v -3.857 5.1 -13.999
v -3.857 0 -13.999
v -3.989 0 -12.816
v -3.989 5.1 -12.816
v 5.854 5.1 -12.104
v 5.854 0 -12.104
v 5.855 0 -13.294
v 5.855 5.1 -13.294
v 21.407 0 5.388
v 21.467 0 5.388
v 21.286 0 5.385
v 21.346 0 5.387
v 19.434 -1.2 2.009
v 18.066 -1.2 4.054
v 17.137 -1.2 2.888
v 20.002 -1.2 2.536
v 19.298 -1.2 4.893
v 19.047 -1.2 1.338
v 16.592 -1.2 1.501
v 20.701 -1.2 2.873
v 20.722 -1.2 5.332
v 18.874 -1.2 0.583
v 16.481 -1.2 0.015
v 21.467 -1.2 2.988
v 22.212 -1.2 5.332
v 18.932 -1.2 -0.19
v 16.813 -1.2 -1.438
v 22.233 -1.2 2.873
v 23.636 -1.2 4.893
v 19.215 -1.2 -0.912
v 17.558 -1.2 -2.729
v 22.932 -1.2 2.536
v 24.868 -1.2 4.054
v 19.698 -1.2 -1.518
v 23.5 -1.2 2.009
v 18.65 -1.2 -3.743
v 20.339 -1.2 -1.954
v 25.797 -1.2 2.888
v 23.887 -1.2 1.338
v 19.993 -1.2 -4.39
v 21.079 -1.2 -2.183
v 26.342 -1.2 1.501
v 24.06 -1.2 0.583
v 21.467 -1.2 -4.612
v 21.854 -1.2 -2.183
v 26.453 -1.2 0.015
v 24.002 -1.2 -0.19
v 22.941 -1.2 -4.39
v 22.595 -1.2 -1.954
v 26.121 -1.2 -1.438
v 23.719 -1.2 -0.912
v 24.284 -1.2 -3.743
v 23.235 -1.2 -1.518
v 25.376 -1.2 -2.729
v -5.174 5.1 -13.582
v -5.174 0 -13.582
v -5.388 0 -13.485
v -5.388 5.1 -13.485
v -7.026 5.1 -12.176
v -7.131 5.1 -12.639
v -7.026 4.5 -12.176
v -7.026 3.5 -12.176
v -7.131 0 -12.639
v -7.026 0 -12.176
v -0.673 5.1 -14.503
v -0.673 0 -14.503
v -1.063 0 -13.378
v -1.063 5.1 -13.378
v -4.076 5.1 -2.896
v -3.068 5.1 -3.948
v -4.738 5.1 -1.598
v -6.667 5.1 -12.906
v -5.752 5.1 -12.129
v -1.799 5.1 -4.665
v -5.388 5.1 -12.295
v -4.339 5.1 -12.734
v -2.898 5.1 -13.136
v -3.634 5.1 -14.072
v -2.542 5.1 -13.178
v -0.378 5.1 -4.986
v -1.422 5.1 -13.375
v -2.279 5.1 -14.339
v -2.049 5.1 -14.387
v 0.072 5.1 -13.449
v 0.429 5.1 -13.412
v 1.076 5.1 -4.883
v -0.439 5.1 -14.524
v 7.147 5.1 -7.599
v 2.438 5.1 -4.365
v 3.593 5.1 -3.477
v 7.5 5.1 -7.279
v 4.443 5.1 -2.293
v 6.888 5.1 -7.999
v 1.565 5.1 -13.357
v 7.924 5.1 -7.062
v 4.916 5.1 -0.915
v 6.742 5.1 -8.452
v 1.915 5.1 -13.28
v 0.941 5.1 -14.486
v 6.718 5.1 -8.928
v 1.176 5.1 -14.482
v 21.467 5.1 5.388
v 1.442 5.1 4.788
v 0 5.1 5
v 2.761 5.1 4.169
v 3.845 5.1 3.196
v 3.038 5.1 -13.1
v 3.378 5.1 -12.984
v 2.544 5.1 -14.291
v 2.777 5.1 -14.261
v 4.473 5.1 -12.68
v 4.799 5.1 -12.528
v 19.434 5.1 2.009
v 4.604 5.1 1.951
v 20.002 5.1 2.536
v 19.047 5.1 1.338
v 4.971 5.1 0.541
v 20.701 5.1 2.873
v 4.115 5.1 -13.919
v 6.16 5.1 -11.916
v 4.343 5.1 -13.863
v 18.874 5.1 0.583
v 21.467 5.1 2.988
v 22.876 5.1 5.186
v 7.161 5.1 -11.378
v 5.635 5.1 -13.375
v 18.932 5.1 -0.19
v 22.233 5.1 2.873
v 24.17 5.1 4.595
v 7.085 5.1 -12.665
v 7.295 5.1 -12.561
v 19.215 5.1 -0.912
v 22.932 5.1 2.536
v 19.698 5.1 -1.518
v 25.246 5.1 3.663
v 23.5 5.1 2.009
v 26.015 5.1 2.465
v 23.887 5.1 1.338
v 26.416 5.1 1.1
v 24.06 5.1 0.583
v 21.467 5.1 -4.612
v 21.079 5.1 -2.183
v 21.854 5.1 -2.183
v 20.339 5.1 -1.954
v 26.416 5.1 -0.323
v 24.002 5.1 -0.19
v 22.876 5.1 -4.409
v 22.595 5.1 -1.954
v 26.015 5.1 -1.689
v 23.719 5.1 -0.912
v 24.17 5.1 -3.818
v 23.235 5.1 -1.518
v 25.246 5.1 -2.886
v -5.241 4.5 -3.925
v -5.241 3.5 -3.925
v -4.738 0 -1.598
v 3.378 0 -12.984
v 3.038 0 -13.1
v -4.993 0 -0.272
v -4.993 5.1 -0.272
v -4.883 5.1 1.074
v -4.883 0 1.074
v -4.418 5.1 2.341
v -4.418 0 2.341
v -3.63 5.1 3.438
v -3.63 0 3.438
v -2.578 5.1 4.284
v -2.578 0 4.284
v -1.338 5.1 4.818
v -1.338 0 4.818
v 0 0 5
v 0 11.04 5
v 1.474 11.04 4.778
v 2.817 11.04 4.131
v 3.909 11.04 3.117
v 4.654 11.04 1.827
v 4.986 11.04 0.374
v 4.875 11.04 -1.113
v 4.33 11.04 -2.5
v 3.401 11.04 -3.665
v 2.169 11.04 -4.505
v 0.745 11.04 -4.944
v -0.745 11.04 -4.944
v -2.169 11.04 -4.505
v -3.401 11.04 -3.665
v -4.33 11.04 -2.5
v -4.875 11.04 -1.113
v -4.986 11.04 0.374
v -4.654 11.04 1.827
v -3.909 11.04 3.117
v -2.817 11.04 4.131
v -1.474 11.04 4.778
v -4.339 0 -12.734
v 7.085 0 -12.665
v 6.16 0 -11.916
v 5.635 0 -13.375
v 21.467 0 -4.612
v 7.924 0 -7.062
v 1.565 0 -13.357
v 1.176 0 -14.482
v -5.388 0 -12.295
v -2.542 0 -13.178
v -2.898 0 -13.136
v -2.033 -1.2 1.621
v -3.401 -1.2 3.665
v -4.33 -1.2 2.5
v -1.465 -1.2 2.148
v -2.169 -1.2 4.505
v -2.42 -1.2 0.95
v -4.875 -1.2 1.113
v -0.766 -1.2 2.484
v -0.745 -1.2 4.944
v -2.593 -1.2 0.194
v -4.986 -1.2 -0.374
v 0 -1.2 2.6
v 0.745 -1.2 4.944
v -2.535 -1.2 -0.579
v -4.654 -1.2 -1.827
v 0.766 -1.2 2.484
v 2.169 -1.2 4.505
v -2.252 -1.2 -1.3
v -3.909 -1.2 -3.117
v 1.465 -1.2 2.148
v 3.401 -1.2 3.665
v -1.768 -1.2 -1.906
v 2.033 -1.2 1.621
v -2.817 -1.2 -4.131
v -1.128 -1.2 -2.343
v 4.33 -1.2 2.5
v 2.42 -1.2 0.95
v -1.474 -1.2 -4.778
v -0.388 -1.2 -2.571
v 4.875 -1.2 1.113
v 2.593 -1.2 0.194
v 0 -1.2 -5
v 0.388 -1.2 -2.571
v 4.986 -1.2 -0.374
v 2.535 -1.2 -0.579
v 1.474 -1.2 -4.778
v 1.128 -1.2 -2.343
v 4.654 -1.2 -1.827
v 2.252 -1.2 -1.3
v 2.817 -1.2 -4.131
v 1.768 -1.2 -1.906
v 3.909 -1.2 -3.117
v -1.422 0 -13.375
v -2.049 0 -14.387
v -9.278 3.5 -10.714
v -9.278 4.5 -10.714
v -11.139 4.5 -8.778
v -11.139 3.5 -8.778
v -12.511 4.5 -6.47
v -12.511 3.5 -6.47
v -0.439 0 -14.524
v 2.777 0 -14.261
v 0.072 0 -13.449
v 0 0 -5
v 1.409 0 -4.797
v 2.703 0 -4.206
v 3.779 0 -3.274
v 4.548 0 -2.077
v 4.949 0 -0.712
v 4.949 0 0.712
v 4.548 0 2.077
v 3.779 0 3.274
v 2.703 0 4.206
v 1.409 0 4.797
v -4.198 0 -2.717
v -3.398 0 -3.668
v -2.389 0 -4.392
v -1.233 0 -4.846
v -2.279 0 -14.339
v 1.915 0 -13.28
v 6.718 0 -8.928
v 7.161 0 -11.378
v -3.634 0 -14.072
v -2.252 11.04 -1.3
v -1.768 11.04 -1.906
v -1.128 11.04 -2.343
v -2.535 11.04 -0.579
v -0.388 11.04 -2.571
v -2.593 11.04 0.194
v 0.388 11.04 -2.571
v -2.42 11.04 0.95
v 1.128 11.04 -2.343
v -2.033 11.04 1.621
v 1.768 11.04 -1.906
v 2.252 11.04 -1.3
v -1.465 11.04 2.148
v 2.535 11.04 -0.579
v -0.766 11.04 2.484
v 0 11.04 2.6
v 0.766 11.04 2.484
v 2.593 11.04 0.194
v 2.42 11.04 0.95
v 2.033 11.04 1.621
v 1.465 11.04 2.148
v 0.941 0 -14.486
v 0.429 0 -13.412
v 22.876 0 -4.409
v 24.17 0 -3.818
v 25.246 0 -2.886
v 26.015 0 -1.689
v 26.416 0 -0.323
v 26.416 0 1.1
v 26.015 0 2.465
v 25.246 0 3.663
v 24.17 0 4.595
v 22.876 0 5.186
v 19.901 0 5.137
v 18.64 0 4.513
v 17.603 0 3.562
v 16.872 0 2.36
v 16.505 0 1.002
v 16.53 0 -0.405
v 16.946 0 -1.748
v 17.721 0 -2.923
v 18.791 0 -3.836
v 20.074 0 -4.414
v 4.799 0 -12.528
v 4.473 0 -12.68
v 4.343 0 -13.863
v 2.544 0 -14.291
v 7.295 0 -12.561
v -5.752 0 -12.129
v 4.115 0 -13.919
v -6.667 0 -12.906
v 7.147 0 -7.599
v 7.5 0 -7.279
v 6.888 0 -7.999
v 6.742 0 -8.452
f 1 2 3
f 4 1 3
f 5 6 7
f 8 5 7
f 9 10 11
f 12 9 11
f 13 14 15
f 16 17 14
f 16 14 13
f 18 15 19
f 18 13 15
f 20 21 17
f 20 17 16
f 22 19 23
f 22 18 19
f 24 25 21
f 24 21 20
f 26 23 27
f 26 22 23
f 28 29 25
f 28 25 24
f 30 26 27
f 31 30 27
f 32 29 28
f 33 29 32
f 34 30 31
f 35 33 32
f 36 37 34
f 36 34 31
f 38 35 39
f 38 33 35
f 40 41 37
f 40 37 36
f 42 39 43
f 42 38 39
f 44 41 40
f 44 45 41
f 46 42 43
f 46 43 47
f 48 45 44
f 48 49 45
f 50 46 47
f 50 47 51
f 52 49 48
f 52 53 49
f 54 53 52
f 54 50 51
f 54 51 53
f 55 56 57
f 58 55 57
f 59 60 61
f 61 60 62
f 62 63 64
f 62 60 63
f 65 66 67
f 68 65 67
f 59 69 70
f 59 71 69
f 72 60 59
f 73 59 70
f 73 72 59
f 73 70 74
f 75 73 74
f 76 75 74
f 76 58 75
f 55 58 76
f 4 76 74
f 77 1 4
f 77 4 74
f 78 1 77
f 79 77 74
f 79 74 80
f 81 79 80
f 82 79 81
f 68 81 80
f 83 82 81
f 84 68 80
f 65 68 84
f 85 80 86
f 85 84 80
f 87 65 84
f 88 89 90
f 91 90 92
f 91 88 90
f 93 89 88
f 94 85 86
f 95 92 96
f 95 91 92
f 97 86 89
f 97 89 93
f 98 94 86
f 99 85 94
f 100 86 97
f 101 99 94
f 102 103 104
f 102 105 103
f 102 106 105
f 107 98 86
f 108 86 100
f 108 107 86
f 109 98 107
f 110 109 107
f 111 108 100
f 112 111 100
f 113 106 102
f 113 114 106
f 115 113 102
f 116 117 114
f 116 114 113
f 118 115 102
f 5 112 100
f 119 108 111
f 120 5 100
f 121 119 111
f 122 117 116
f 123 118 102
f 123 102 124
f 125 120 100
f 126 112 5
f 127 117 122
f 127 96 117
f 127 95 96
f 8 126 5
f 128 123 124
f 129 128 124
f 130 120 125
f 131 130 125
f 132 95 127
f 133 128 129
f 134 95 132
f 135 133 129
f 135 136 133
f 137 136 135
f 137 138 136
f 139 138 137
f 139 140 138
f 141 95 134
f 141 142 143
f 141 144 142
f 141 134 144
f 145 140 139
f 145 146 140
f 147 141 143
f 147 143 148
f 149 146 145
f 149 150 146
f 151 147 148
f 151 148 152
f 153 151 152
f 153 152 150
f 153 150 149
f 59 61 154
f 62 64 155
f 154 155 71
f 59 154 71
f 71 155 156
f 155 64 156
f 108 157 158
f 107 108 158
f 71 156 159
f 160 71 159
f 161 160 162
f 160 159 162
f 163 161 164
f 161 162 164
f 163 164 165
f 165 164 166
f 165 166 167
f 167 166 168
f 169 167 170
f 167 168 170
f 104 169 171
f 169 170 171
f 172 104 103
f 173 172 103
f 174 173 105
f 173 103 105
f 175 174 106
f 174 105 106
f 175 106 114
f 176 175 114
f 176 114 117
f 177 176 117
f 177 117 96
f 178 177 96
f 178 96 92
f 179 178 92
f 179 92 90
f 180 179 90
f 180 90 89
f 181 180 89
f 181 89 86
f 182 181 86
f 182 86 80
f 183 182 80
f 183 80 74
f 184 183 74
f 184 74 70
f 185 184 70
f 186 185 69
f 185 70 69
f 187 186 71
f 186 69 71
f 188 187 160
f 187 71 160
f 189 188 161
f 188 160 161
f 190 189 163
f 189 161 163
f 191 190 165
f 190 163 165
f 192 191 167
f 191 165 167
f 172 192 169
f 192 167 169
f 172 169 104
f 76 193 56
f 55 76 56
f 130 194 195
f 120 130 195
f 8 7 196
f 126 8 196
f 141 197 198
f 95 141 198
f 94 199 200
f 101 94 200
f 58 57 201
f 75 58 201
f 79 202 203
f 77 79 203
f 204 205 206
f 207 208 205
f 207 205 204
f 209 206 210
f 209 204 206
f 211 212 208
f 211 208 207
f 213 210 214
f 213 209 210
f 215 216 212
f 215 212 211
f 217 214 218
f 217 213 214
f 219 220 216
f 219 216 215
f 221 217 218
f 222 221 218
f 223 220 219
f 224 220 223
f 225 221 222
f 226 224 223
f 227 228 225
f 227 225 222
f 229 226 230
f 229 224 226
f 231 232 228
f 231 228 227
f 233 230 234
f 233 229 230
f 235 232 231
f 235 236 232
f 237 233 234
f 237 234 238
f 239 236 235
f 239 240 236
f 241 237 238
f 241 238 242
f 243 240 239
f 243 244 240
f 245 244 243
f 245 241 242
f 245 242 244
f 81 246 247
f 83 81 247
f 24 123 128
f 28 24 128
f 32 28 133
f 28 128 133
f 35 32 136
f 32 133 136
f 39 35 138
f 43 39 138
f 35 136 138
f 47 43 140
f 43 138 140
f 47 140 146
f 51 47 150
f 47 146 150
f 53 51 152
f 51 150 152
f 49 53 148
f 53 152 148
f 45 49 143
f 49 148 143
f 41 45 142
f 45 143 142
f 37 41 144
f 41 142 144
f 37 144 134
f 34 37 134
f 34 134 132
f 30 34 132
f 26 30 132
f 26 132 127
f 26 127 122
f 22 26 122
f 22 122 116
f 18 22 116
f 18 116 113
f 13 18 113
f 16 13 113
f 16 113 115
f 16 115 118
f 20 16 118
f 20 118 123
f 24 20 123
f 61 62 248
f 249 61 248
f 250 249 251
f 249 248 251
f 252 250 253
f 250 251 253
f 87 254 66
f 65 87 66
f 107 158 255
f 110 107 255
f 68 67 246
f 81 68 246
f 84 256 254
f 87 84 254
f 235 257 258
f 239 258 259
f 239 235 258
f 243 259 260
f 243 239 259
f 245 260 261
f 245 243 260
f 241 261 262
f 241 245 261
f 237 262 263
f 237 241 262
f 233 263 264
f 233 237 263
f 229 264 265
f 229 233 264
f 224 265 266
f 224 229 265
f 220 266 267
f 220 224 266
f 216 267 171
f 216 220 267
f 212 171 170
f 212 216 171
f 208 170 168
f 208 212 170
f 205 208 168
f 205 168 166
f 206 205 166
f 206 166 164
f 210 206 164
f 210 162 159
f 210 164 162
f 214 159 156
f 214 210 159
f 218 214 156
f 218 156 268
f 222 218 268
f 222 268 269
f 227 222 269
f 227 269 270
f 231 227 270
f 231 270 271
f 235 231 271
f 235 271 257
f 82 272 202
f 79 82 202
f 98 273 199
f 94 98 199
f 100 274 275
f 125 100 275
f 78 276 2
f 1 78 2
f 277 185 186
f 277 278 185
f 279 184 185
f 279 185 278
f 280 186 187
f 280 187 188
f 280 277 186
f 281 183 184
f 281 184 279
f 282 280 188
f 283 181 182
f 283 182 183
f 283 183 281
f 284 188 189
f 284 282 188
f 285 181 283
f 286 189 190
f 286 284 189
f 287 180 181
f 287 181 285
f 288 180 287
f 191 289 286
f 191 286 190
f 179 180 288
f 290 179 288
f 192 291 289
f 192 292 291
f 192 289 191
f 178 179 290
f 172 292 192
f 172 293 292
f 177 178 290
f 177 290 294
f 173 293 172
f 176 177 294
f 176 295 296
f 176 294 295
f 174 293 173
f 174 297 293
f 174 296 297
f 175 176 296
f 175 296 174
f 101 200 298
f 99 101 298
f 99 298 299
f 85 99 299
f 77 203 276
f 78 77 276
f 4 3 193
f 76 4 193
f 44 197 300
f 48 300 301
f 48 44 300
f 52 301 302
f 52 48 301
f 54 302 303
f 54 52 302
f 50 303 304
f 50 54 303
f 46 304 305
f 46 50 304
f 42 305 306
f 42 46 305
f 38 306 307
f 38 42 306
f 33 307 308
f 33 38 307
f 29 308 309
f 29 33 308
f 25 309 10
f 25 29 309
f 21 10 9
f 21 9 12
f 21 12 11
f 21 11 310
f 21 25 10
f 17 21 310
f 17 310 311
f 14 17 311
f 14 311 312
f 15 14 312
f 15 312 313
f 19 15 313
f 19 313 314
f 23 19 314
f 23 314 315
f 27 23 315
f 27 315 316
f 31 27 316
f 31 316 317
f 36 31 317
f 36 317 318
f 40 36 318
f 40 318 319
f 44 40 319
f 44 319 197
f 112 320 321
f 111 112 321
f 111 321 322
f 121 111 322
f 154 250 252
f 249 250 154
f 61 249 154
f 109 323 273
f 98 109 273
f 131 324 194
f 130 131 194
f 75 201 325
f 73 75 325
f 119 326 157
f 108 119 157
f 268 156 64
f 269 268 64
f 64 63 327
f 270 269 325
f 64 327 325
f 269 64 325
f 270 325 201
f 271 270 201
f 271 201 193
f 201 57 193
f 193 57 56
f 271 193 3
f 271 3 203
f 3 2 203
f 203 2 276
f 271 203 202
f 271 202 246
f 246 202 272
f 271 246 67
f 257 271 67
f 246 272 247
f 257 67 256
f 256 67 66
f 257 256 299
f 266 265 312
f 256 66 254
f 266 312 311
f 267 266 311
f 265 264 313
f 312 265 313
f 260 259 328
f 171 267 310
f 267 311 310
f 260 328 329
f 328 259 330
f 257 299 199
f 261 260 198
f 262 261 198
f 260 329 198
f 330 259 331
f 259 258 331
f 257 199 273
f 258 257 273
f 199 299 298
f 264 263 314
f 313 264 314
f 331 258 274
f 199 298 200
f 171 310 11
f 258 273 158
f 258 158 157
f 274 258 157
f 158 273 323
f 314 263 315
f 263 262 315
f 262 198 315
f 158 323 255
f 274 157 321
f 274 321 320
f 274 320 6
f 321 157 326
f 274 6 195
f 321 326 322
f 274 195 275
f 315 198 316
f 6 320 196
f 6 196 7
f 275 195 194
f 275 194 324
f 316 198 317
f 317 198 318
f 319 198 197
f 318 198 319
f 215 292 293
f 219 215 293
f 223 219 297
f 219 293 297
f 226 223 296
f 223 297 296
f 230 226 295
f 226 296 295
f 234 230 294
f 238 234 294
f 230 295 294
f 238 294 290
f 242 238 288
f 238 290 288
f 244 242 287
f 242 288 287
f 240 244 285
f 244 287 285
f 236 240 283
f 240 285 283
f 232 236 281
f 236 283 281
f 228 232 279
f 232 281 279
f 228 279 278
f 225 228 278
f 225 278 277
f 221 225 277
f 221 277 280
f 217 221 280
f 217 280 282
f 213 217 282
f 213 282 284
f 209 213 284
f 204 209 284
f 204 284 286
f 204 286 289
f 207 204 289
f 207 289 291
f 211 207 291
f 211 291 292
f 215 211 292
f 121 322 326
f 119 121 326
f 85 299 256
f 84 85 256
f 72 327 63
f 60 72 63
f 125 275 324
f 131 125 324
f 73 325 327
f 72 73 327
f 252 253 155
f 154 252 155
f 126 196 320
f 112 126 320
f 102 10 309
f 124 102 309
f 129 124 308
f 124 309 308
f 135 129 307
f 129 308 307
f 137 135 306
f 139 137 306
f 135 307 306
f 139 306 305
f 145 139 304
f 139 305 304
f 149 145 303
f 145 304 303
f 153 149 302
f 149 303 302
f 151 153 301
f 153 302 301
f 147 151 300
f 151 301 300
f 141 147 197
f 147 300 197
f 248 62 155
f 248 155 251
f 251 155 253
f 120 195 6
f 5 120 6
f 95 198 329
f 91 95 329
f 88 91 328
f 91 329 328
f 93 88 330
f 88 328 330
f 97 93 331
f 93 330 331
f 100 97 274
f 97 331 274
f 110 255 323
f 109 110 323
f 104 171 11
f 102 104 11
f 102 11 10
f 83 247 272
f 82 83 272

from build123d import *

# Parameters (mm, degrees)
SKETCH_1_R          = 2.4999999999999982
SKETCH_1_R_2        = 2.5000000000000027
EXTRUDE_1_DEPTH     = 5.1
SKETCH_2_R          = 4.999999999999998
SKETCH_2_R_2        = 2.5
EXTRUDE_2_DEPTH     = 5.94
CUT_EXTRUDE_1_DEPTH = 3.5
CUT_EXTRUDE_START   = -0.6
CUT_EXTRUDE_3_DEPTH = 0.6
EXTRUDE_START       = 1.2
SKETCH_6_R          = 4.999999999999998
SKETCH_6_R_2        = 2.5
SKETCH_6_R_3        = 5
SKETCH_6_R_4        = 2.4999999999999987
EXTRUDE_4_DEPTH     = 1.2
SKETCH_7_R          = 2.6000000000000005
CUT_EXTRUDE_4_DEPTH = 33.57721194023454
SKETCH_8_R          = 2.6
CUT_EXTRUDE_5_DEPTH = 31.8406734329677


with BuildPart() as part:
    # Эскиз1 → Бобышка-Вытянуть1 (new body)
    with BuildSketch(Plane(origin=(0, 0, 0), x_dir=(1, 0, 0), z_dir=(0, 1, 0))):
        with BuildLine():
            Line((6.718023264525762, 8.928267668376021), (7.161238337218641, 11.37785065819786))
            Line((7.161238337218641, 11.37785065819786), (7.294846288705666, 12.560700282216452))
            Line((7.294846288705666, 12.560700282216452), (7.085001061393901, 12.665407082864023))
            Line((7.085001061393901, 12.665407082864023), (6.15987792536569, 11.916319971156167))
            Line((6.15987792536569, 11.916319971156167), (5.853623131200735, 12.10383694173367))
            Line((5.853623131200735, 12.10383694173367), (5.855060736117009, 13.29420757772634))
            Line((5.855060736117009, 13.29420757772634), (5.634886528714601, 13.37496556136943))
            Line((5.634886528714601, 13.37496556136943), (4.798663389284832, 12.527784837542624))
            Line((4.798663389284832, 12.527784837542624), (4.473480547373511, 12.680135526842204))
            Line((4.473480547373511, 12.680135526842204), (4.342730025112913, 13.863304415323501))
            Line((4.342730025112913, 13.863304415323501), (4.114949999467502, 13.919114749889351))
            Line((4.114949999467502, 13.919114749889351), (3.3779694438823102, 12.984318526945106))
            Line((3.3779694438823102, 12.984318526945106), (3.0378804853992434, 13.099618628946285))
            Line((3.0378804853992434, 13.099618628946285), (2.776558986480811, 14.260952083189514))
            Line((2.776558986480811, 14.260952083189514), (2.54399037483231, 14.291124494483034))
            Line((2.54399037483231, 14.291124494483034), (1.9153675367628848, 13.280274532718662))
            Line((1.9153675367628848, 13.280274532718662), (1.56457875493138, 13.35709799101592))
            Line((1.56457875493138, 13.35709799101592), (1.175918359734634, 14.482232389631033))
            Line((1.175918359734634, 14.482232389631033), (0.9414376205823001, 14.486393698794194))
            Line((0.9414376205823001, 14.486393698794194), (0.4289474421954887, 13.411992407470256))
            Line((0.42894744219548875, 13.411992407470256), (0.07179746795026506, 13.449389053044667))
            Line((0.07179746795026506, 13.449389053044667), (-0.4393947883485354, 14.524408492330128))
            Line((-0.43939478834853546, 14.524408492330128), (-0.6728875469021285, 14.502507231398162))
            Line((-0.6728875469021285, 14.502507231398162), (-1.062906477097084, 13.377843036257644))
            Line((-1.062906477097084, 13.377843036257644), (-1.4220003362283888, 13.375350339371238))
            Line((-1.4220003362283888, 13.375350339371238), (-2.049401918098927, 14.386958748197415))
            Line((-2.049401918098927, 14.386958748197415), (-2.279018807507275, 14.33926579666565))
            Line((-2.279018807507275, 14.33926579666565), (-2.5417426516817105, 13.178248785832608))
            Line((-2.5417426516817105, 13.178248785832608), (-2.898339045786024, 13.13589757669542))
            Line((-2.898339045786024, 13.13589757669542), (-3.6341901158202092, 14.071583165165732))
            Line((-3.6341901158202092, 14.071583165165732), (-3.8570911851181764, 13.998688399693854))
            Line((-3.8570911851181764, 13.998688399693854), (-3.989270518385492, 12.815678280718325))
            Line((-3.989270518385492, 12.815678280718325), (-4.3389589867331635, 12.733992368173748))
            Line((-4.3389589867331635, 12.733992368173748), (-5.174158380979493, 13.582182376127184))
            Line((-5.174158380979493, 13.582182376127184), (-5.3875867419063175, 13.48498737481814))
            Line((-5.3875867419063175, 13.48498737481814), (-5.3875867419063175, 12.2946158707315))
            Line((-5.3875867419063175, 12.2946158707315), (-5.751610974482103, 12.12883970299033))
            Line((-5.751610974482103, 12.12883970299033), (-6.666748566138722, 12.905854249247858))
            Line((-6.666748566138722, 12.905854249247858), (-7.13096440438616, 12.63943472468846))
            Line((-7.13096440438616, 12.63943472468846), (-7.025830916712447, 12.175864106991055))
            ThreePointArc((-7.025830916712449, 12.175864106991055), (-10.264322646127633, 9.799709596012173), (-12.51111253150909, 6.470163958468902))
            Line((-12.51111253150909, 6.470163958468902), (-5.241071220187256, 3.924995297345621))
            Line((-5.241071220187256, 3.924995297345621), (-4.737733567637334, 1.5980865565051285))
            ThreePointArc((-4.737733567637334, 1.5980865565051288), (-4.061430338102922, -2.9162962141622684), (1.55e-15, -5))
            Line((2.2e-16, -5), (21.46693589645179, -5.388260461869603))
            ThreePointArc((21.46693589645179, -5.388260461869605), (26.46693589645179, -0.3882604618696045), (21.46693589645179, 4.611739538130397))
            Line((21.46693589645179, 4.611739538130397), (7.924308406385933, 7.062073595968816))
            ThreePointArc((7.924308406385932, 7.062073595968816), (7.00463576208043, 7.790569444059032), (6.718023264525762, 8.928267668376021))
        make_face()
        with Locations(Location((21.46693589645179, -0.38826046186960367, 0), (0, 0, 270))):
            Circle(SKETCH_1_R, mode=Mode.SUBTRACT)
        with Locations(Location((-2.78e-15, -1.44e-15, 0), (0, 0, 270))):
            Circle(SKETCH_1_R_2, mode=Mode.SUBTRACT)
    extrude(amount=EXTRUDE_1_DEPTH)

    # Эскиз2 → Бобышка-Вытянуть2 (add)
    with BuildSketch(Plane(origin=(0, 5.1, 0), x_dir=(1, 0, 0), z_dir=(0, 1, 0))):
        with Locations(Location((0, 0, 0), (0, 0, 270))):
            Circle(SKETCH_2_R)
        with Locations(Location((0, 0, 0), (0, 0, 270))):
            Circle(SKETCH_2_R_2, mode=Mode.SUBTRACT)
    extrude(amount=EXTRUDE_2_DEPTH)

    # Эскиз4 → Вырез-Вытянуть1 (cut)
    with BuildSketch(Plane.XZ):
        with BuildLine():
            Line((-5.241071220187255, -3.924995297345621), (-7.025830916712447, -12.175864106991055))
            ThreePointArc((-7.025830916712447, -12.175864106991055), (-10.264322646127628, -9.799709596012166), (-12.511112531509088, -6.470163958468901))
            Line((-12.511112531509088, -6.470163958468901), (-5.241071220187255, -3.924995297345621))
        make_face()
    extrude(amount=-CUT_EXTRUDE_1_DEPTH, mode=Mode.SUBTRACT)

    # Эскиз5 → Вырез-Вытянуть3 (cut)
    with BuildSketch(Plane(origin=(0, 5.1, 0), x_dir=(1, 0, 0), z_dir=(0, 1, 0)).offset(CUT_EXTRUDE_START)):
        with BuildLine():
            Line((-5.241071220187255, 3.924995297345621), (-7.025830916712447, 12.175864106991055))
            ThreePointArc((-7.025830916712447, 12.175864106991055), (-10.264322646127628, 9.799709596012168), (-12.511112531509088, 6.470163958468901))
            Line((-12.511112531509088, 6.470163958468901), (-5.241071220187255, 3.924995297345621))
        make_face()
    extrude(amount=CUT_EXTRUDE_3_DEPTH, mode=Mode.SUBTRACT)

    # Эскиз6 → Бобышка-Вытянуть4 (add)
    # profile 1 of 2: a face of its own
    with BuildSketch(Plane.XZ.offset(EXTRUDE_START)):
        with Locations(Location((0, 0, 0), (0, 0, 270))):
            Circle(SKETCH_6_R)
        with Locations(Location((0, 0, 0), (0, 0, 270))):
            Circle(SKETCH_6_R_2, mode=Mode.SUBTRACT)
    # profile 2 of 2: a face of its own
    with BuildSketch(Plane.XZ.offset(EXTRUDE_START)):
        with Locations(Location((21.46693589645179, 0.38826046186960295, 0), (0, 0, 270))):
            Circle(SKETCH_6_R_3)
        with Locations(Location((21.46693589645179, 0.38826046186960295, 0), (0, 0, 270))):
            Circle(SKETCH_6_R_4, mode=Mode.SUBTRACT)
    extrude(amount=-EXTRUDE_4_DEPTH)

    # Эскиз7 → Вырез-Вытянуть4 (cut, through all)
    with BuildSketch(Plane(origin=(0, 11.04, 0), x_dir=(1, 0, 0), z_dir=(0, 1, 0))):
        with Locations(Location((0, 0, 0), (0, 0, 270))):
            Circle(SKETCH_7_R)
    extrude(amount=-CUT_EXTRUDE_4_DEPTH, mode=Mode.SUBTRACT)

    # Эскиз8 → Вырез-Вытянуть5 (cut, through all)
    with BuildSketch(Plane(origin=(0, 5.1, 0), x_dir=(1, 0, 0), z_dir=(0, 1, 0))):
        with Locations(Location((21.46693589645179, -0.38826046186960295, 0), (0, 0, 270))):
            Circle(SKETCH_8_R)
    extrude(amount=-CUT_EXTRUDE_5_DEPTH, mode=Mode.SUBTRACT)


solid = part.part
